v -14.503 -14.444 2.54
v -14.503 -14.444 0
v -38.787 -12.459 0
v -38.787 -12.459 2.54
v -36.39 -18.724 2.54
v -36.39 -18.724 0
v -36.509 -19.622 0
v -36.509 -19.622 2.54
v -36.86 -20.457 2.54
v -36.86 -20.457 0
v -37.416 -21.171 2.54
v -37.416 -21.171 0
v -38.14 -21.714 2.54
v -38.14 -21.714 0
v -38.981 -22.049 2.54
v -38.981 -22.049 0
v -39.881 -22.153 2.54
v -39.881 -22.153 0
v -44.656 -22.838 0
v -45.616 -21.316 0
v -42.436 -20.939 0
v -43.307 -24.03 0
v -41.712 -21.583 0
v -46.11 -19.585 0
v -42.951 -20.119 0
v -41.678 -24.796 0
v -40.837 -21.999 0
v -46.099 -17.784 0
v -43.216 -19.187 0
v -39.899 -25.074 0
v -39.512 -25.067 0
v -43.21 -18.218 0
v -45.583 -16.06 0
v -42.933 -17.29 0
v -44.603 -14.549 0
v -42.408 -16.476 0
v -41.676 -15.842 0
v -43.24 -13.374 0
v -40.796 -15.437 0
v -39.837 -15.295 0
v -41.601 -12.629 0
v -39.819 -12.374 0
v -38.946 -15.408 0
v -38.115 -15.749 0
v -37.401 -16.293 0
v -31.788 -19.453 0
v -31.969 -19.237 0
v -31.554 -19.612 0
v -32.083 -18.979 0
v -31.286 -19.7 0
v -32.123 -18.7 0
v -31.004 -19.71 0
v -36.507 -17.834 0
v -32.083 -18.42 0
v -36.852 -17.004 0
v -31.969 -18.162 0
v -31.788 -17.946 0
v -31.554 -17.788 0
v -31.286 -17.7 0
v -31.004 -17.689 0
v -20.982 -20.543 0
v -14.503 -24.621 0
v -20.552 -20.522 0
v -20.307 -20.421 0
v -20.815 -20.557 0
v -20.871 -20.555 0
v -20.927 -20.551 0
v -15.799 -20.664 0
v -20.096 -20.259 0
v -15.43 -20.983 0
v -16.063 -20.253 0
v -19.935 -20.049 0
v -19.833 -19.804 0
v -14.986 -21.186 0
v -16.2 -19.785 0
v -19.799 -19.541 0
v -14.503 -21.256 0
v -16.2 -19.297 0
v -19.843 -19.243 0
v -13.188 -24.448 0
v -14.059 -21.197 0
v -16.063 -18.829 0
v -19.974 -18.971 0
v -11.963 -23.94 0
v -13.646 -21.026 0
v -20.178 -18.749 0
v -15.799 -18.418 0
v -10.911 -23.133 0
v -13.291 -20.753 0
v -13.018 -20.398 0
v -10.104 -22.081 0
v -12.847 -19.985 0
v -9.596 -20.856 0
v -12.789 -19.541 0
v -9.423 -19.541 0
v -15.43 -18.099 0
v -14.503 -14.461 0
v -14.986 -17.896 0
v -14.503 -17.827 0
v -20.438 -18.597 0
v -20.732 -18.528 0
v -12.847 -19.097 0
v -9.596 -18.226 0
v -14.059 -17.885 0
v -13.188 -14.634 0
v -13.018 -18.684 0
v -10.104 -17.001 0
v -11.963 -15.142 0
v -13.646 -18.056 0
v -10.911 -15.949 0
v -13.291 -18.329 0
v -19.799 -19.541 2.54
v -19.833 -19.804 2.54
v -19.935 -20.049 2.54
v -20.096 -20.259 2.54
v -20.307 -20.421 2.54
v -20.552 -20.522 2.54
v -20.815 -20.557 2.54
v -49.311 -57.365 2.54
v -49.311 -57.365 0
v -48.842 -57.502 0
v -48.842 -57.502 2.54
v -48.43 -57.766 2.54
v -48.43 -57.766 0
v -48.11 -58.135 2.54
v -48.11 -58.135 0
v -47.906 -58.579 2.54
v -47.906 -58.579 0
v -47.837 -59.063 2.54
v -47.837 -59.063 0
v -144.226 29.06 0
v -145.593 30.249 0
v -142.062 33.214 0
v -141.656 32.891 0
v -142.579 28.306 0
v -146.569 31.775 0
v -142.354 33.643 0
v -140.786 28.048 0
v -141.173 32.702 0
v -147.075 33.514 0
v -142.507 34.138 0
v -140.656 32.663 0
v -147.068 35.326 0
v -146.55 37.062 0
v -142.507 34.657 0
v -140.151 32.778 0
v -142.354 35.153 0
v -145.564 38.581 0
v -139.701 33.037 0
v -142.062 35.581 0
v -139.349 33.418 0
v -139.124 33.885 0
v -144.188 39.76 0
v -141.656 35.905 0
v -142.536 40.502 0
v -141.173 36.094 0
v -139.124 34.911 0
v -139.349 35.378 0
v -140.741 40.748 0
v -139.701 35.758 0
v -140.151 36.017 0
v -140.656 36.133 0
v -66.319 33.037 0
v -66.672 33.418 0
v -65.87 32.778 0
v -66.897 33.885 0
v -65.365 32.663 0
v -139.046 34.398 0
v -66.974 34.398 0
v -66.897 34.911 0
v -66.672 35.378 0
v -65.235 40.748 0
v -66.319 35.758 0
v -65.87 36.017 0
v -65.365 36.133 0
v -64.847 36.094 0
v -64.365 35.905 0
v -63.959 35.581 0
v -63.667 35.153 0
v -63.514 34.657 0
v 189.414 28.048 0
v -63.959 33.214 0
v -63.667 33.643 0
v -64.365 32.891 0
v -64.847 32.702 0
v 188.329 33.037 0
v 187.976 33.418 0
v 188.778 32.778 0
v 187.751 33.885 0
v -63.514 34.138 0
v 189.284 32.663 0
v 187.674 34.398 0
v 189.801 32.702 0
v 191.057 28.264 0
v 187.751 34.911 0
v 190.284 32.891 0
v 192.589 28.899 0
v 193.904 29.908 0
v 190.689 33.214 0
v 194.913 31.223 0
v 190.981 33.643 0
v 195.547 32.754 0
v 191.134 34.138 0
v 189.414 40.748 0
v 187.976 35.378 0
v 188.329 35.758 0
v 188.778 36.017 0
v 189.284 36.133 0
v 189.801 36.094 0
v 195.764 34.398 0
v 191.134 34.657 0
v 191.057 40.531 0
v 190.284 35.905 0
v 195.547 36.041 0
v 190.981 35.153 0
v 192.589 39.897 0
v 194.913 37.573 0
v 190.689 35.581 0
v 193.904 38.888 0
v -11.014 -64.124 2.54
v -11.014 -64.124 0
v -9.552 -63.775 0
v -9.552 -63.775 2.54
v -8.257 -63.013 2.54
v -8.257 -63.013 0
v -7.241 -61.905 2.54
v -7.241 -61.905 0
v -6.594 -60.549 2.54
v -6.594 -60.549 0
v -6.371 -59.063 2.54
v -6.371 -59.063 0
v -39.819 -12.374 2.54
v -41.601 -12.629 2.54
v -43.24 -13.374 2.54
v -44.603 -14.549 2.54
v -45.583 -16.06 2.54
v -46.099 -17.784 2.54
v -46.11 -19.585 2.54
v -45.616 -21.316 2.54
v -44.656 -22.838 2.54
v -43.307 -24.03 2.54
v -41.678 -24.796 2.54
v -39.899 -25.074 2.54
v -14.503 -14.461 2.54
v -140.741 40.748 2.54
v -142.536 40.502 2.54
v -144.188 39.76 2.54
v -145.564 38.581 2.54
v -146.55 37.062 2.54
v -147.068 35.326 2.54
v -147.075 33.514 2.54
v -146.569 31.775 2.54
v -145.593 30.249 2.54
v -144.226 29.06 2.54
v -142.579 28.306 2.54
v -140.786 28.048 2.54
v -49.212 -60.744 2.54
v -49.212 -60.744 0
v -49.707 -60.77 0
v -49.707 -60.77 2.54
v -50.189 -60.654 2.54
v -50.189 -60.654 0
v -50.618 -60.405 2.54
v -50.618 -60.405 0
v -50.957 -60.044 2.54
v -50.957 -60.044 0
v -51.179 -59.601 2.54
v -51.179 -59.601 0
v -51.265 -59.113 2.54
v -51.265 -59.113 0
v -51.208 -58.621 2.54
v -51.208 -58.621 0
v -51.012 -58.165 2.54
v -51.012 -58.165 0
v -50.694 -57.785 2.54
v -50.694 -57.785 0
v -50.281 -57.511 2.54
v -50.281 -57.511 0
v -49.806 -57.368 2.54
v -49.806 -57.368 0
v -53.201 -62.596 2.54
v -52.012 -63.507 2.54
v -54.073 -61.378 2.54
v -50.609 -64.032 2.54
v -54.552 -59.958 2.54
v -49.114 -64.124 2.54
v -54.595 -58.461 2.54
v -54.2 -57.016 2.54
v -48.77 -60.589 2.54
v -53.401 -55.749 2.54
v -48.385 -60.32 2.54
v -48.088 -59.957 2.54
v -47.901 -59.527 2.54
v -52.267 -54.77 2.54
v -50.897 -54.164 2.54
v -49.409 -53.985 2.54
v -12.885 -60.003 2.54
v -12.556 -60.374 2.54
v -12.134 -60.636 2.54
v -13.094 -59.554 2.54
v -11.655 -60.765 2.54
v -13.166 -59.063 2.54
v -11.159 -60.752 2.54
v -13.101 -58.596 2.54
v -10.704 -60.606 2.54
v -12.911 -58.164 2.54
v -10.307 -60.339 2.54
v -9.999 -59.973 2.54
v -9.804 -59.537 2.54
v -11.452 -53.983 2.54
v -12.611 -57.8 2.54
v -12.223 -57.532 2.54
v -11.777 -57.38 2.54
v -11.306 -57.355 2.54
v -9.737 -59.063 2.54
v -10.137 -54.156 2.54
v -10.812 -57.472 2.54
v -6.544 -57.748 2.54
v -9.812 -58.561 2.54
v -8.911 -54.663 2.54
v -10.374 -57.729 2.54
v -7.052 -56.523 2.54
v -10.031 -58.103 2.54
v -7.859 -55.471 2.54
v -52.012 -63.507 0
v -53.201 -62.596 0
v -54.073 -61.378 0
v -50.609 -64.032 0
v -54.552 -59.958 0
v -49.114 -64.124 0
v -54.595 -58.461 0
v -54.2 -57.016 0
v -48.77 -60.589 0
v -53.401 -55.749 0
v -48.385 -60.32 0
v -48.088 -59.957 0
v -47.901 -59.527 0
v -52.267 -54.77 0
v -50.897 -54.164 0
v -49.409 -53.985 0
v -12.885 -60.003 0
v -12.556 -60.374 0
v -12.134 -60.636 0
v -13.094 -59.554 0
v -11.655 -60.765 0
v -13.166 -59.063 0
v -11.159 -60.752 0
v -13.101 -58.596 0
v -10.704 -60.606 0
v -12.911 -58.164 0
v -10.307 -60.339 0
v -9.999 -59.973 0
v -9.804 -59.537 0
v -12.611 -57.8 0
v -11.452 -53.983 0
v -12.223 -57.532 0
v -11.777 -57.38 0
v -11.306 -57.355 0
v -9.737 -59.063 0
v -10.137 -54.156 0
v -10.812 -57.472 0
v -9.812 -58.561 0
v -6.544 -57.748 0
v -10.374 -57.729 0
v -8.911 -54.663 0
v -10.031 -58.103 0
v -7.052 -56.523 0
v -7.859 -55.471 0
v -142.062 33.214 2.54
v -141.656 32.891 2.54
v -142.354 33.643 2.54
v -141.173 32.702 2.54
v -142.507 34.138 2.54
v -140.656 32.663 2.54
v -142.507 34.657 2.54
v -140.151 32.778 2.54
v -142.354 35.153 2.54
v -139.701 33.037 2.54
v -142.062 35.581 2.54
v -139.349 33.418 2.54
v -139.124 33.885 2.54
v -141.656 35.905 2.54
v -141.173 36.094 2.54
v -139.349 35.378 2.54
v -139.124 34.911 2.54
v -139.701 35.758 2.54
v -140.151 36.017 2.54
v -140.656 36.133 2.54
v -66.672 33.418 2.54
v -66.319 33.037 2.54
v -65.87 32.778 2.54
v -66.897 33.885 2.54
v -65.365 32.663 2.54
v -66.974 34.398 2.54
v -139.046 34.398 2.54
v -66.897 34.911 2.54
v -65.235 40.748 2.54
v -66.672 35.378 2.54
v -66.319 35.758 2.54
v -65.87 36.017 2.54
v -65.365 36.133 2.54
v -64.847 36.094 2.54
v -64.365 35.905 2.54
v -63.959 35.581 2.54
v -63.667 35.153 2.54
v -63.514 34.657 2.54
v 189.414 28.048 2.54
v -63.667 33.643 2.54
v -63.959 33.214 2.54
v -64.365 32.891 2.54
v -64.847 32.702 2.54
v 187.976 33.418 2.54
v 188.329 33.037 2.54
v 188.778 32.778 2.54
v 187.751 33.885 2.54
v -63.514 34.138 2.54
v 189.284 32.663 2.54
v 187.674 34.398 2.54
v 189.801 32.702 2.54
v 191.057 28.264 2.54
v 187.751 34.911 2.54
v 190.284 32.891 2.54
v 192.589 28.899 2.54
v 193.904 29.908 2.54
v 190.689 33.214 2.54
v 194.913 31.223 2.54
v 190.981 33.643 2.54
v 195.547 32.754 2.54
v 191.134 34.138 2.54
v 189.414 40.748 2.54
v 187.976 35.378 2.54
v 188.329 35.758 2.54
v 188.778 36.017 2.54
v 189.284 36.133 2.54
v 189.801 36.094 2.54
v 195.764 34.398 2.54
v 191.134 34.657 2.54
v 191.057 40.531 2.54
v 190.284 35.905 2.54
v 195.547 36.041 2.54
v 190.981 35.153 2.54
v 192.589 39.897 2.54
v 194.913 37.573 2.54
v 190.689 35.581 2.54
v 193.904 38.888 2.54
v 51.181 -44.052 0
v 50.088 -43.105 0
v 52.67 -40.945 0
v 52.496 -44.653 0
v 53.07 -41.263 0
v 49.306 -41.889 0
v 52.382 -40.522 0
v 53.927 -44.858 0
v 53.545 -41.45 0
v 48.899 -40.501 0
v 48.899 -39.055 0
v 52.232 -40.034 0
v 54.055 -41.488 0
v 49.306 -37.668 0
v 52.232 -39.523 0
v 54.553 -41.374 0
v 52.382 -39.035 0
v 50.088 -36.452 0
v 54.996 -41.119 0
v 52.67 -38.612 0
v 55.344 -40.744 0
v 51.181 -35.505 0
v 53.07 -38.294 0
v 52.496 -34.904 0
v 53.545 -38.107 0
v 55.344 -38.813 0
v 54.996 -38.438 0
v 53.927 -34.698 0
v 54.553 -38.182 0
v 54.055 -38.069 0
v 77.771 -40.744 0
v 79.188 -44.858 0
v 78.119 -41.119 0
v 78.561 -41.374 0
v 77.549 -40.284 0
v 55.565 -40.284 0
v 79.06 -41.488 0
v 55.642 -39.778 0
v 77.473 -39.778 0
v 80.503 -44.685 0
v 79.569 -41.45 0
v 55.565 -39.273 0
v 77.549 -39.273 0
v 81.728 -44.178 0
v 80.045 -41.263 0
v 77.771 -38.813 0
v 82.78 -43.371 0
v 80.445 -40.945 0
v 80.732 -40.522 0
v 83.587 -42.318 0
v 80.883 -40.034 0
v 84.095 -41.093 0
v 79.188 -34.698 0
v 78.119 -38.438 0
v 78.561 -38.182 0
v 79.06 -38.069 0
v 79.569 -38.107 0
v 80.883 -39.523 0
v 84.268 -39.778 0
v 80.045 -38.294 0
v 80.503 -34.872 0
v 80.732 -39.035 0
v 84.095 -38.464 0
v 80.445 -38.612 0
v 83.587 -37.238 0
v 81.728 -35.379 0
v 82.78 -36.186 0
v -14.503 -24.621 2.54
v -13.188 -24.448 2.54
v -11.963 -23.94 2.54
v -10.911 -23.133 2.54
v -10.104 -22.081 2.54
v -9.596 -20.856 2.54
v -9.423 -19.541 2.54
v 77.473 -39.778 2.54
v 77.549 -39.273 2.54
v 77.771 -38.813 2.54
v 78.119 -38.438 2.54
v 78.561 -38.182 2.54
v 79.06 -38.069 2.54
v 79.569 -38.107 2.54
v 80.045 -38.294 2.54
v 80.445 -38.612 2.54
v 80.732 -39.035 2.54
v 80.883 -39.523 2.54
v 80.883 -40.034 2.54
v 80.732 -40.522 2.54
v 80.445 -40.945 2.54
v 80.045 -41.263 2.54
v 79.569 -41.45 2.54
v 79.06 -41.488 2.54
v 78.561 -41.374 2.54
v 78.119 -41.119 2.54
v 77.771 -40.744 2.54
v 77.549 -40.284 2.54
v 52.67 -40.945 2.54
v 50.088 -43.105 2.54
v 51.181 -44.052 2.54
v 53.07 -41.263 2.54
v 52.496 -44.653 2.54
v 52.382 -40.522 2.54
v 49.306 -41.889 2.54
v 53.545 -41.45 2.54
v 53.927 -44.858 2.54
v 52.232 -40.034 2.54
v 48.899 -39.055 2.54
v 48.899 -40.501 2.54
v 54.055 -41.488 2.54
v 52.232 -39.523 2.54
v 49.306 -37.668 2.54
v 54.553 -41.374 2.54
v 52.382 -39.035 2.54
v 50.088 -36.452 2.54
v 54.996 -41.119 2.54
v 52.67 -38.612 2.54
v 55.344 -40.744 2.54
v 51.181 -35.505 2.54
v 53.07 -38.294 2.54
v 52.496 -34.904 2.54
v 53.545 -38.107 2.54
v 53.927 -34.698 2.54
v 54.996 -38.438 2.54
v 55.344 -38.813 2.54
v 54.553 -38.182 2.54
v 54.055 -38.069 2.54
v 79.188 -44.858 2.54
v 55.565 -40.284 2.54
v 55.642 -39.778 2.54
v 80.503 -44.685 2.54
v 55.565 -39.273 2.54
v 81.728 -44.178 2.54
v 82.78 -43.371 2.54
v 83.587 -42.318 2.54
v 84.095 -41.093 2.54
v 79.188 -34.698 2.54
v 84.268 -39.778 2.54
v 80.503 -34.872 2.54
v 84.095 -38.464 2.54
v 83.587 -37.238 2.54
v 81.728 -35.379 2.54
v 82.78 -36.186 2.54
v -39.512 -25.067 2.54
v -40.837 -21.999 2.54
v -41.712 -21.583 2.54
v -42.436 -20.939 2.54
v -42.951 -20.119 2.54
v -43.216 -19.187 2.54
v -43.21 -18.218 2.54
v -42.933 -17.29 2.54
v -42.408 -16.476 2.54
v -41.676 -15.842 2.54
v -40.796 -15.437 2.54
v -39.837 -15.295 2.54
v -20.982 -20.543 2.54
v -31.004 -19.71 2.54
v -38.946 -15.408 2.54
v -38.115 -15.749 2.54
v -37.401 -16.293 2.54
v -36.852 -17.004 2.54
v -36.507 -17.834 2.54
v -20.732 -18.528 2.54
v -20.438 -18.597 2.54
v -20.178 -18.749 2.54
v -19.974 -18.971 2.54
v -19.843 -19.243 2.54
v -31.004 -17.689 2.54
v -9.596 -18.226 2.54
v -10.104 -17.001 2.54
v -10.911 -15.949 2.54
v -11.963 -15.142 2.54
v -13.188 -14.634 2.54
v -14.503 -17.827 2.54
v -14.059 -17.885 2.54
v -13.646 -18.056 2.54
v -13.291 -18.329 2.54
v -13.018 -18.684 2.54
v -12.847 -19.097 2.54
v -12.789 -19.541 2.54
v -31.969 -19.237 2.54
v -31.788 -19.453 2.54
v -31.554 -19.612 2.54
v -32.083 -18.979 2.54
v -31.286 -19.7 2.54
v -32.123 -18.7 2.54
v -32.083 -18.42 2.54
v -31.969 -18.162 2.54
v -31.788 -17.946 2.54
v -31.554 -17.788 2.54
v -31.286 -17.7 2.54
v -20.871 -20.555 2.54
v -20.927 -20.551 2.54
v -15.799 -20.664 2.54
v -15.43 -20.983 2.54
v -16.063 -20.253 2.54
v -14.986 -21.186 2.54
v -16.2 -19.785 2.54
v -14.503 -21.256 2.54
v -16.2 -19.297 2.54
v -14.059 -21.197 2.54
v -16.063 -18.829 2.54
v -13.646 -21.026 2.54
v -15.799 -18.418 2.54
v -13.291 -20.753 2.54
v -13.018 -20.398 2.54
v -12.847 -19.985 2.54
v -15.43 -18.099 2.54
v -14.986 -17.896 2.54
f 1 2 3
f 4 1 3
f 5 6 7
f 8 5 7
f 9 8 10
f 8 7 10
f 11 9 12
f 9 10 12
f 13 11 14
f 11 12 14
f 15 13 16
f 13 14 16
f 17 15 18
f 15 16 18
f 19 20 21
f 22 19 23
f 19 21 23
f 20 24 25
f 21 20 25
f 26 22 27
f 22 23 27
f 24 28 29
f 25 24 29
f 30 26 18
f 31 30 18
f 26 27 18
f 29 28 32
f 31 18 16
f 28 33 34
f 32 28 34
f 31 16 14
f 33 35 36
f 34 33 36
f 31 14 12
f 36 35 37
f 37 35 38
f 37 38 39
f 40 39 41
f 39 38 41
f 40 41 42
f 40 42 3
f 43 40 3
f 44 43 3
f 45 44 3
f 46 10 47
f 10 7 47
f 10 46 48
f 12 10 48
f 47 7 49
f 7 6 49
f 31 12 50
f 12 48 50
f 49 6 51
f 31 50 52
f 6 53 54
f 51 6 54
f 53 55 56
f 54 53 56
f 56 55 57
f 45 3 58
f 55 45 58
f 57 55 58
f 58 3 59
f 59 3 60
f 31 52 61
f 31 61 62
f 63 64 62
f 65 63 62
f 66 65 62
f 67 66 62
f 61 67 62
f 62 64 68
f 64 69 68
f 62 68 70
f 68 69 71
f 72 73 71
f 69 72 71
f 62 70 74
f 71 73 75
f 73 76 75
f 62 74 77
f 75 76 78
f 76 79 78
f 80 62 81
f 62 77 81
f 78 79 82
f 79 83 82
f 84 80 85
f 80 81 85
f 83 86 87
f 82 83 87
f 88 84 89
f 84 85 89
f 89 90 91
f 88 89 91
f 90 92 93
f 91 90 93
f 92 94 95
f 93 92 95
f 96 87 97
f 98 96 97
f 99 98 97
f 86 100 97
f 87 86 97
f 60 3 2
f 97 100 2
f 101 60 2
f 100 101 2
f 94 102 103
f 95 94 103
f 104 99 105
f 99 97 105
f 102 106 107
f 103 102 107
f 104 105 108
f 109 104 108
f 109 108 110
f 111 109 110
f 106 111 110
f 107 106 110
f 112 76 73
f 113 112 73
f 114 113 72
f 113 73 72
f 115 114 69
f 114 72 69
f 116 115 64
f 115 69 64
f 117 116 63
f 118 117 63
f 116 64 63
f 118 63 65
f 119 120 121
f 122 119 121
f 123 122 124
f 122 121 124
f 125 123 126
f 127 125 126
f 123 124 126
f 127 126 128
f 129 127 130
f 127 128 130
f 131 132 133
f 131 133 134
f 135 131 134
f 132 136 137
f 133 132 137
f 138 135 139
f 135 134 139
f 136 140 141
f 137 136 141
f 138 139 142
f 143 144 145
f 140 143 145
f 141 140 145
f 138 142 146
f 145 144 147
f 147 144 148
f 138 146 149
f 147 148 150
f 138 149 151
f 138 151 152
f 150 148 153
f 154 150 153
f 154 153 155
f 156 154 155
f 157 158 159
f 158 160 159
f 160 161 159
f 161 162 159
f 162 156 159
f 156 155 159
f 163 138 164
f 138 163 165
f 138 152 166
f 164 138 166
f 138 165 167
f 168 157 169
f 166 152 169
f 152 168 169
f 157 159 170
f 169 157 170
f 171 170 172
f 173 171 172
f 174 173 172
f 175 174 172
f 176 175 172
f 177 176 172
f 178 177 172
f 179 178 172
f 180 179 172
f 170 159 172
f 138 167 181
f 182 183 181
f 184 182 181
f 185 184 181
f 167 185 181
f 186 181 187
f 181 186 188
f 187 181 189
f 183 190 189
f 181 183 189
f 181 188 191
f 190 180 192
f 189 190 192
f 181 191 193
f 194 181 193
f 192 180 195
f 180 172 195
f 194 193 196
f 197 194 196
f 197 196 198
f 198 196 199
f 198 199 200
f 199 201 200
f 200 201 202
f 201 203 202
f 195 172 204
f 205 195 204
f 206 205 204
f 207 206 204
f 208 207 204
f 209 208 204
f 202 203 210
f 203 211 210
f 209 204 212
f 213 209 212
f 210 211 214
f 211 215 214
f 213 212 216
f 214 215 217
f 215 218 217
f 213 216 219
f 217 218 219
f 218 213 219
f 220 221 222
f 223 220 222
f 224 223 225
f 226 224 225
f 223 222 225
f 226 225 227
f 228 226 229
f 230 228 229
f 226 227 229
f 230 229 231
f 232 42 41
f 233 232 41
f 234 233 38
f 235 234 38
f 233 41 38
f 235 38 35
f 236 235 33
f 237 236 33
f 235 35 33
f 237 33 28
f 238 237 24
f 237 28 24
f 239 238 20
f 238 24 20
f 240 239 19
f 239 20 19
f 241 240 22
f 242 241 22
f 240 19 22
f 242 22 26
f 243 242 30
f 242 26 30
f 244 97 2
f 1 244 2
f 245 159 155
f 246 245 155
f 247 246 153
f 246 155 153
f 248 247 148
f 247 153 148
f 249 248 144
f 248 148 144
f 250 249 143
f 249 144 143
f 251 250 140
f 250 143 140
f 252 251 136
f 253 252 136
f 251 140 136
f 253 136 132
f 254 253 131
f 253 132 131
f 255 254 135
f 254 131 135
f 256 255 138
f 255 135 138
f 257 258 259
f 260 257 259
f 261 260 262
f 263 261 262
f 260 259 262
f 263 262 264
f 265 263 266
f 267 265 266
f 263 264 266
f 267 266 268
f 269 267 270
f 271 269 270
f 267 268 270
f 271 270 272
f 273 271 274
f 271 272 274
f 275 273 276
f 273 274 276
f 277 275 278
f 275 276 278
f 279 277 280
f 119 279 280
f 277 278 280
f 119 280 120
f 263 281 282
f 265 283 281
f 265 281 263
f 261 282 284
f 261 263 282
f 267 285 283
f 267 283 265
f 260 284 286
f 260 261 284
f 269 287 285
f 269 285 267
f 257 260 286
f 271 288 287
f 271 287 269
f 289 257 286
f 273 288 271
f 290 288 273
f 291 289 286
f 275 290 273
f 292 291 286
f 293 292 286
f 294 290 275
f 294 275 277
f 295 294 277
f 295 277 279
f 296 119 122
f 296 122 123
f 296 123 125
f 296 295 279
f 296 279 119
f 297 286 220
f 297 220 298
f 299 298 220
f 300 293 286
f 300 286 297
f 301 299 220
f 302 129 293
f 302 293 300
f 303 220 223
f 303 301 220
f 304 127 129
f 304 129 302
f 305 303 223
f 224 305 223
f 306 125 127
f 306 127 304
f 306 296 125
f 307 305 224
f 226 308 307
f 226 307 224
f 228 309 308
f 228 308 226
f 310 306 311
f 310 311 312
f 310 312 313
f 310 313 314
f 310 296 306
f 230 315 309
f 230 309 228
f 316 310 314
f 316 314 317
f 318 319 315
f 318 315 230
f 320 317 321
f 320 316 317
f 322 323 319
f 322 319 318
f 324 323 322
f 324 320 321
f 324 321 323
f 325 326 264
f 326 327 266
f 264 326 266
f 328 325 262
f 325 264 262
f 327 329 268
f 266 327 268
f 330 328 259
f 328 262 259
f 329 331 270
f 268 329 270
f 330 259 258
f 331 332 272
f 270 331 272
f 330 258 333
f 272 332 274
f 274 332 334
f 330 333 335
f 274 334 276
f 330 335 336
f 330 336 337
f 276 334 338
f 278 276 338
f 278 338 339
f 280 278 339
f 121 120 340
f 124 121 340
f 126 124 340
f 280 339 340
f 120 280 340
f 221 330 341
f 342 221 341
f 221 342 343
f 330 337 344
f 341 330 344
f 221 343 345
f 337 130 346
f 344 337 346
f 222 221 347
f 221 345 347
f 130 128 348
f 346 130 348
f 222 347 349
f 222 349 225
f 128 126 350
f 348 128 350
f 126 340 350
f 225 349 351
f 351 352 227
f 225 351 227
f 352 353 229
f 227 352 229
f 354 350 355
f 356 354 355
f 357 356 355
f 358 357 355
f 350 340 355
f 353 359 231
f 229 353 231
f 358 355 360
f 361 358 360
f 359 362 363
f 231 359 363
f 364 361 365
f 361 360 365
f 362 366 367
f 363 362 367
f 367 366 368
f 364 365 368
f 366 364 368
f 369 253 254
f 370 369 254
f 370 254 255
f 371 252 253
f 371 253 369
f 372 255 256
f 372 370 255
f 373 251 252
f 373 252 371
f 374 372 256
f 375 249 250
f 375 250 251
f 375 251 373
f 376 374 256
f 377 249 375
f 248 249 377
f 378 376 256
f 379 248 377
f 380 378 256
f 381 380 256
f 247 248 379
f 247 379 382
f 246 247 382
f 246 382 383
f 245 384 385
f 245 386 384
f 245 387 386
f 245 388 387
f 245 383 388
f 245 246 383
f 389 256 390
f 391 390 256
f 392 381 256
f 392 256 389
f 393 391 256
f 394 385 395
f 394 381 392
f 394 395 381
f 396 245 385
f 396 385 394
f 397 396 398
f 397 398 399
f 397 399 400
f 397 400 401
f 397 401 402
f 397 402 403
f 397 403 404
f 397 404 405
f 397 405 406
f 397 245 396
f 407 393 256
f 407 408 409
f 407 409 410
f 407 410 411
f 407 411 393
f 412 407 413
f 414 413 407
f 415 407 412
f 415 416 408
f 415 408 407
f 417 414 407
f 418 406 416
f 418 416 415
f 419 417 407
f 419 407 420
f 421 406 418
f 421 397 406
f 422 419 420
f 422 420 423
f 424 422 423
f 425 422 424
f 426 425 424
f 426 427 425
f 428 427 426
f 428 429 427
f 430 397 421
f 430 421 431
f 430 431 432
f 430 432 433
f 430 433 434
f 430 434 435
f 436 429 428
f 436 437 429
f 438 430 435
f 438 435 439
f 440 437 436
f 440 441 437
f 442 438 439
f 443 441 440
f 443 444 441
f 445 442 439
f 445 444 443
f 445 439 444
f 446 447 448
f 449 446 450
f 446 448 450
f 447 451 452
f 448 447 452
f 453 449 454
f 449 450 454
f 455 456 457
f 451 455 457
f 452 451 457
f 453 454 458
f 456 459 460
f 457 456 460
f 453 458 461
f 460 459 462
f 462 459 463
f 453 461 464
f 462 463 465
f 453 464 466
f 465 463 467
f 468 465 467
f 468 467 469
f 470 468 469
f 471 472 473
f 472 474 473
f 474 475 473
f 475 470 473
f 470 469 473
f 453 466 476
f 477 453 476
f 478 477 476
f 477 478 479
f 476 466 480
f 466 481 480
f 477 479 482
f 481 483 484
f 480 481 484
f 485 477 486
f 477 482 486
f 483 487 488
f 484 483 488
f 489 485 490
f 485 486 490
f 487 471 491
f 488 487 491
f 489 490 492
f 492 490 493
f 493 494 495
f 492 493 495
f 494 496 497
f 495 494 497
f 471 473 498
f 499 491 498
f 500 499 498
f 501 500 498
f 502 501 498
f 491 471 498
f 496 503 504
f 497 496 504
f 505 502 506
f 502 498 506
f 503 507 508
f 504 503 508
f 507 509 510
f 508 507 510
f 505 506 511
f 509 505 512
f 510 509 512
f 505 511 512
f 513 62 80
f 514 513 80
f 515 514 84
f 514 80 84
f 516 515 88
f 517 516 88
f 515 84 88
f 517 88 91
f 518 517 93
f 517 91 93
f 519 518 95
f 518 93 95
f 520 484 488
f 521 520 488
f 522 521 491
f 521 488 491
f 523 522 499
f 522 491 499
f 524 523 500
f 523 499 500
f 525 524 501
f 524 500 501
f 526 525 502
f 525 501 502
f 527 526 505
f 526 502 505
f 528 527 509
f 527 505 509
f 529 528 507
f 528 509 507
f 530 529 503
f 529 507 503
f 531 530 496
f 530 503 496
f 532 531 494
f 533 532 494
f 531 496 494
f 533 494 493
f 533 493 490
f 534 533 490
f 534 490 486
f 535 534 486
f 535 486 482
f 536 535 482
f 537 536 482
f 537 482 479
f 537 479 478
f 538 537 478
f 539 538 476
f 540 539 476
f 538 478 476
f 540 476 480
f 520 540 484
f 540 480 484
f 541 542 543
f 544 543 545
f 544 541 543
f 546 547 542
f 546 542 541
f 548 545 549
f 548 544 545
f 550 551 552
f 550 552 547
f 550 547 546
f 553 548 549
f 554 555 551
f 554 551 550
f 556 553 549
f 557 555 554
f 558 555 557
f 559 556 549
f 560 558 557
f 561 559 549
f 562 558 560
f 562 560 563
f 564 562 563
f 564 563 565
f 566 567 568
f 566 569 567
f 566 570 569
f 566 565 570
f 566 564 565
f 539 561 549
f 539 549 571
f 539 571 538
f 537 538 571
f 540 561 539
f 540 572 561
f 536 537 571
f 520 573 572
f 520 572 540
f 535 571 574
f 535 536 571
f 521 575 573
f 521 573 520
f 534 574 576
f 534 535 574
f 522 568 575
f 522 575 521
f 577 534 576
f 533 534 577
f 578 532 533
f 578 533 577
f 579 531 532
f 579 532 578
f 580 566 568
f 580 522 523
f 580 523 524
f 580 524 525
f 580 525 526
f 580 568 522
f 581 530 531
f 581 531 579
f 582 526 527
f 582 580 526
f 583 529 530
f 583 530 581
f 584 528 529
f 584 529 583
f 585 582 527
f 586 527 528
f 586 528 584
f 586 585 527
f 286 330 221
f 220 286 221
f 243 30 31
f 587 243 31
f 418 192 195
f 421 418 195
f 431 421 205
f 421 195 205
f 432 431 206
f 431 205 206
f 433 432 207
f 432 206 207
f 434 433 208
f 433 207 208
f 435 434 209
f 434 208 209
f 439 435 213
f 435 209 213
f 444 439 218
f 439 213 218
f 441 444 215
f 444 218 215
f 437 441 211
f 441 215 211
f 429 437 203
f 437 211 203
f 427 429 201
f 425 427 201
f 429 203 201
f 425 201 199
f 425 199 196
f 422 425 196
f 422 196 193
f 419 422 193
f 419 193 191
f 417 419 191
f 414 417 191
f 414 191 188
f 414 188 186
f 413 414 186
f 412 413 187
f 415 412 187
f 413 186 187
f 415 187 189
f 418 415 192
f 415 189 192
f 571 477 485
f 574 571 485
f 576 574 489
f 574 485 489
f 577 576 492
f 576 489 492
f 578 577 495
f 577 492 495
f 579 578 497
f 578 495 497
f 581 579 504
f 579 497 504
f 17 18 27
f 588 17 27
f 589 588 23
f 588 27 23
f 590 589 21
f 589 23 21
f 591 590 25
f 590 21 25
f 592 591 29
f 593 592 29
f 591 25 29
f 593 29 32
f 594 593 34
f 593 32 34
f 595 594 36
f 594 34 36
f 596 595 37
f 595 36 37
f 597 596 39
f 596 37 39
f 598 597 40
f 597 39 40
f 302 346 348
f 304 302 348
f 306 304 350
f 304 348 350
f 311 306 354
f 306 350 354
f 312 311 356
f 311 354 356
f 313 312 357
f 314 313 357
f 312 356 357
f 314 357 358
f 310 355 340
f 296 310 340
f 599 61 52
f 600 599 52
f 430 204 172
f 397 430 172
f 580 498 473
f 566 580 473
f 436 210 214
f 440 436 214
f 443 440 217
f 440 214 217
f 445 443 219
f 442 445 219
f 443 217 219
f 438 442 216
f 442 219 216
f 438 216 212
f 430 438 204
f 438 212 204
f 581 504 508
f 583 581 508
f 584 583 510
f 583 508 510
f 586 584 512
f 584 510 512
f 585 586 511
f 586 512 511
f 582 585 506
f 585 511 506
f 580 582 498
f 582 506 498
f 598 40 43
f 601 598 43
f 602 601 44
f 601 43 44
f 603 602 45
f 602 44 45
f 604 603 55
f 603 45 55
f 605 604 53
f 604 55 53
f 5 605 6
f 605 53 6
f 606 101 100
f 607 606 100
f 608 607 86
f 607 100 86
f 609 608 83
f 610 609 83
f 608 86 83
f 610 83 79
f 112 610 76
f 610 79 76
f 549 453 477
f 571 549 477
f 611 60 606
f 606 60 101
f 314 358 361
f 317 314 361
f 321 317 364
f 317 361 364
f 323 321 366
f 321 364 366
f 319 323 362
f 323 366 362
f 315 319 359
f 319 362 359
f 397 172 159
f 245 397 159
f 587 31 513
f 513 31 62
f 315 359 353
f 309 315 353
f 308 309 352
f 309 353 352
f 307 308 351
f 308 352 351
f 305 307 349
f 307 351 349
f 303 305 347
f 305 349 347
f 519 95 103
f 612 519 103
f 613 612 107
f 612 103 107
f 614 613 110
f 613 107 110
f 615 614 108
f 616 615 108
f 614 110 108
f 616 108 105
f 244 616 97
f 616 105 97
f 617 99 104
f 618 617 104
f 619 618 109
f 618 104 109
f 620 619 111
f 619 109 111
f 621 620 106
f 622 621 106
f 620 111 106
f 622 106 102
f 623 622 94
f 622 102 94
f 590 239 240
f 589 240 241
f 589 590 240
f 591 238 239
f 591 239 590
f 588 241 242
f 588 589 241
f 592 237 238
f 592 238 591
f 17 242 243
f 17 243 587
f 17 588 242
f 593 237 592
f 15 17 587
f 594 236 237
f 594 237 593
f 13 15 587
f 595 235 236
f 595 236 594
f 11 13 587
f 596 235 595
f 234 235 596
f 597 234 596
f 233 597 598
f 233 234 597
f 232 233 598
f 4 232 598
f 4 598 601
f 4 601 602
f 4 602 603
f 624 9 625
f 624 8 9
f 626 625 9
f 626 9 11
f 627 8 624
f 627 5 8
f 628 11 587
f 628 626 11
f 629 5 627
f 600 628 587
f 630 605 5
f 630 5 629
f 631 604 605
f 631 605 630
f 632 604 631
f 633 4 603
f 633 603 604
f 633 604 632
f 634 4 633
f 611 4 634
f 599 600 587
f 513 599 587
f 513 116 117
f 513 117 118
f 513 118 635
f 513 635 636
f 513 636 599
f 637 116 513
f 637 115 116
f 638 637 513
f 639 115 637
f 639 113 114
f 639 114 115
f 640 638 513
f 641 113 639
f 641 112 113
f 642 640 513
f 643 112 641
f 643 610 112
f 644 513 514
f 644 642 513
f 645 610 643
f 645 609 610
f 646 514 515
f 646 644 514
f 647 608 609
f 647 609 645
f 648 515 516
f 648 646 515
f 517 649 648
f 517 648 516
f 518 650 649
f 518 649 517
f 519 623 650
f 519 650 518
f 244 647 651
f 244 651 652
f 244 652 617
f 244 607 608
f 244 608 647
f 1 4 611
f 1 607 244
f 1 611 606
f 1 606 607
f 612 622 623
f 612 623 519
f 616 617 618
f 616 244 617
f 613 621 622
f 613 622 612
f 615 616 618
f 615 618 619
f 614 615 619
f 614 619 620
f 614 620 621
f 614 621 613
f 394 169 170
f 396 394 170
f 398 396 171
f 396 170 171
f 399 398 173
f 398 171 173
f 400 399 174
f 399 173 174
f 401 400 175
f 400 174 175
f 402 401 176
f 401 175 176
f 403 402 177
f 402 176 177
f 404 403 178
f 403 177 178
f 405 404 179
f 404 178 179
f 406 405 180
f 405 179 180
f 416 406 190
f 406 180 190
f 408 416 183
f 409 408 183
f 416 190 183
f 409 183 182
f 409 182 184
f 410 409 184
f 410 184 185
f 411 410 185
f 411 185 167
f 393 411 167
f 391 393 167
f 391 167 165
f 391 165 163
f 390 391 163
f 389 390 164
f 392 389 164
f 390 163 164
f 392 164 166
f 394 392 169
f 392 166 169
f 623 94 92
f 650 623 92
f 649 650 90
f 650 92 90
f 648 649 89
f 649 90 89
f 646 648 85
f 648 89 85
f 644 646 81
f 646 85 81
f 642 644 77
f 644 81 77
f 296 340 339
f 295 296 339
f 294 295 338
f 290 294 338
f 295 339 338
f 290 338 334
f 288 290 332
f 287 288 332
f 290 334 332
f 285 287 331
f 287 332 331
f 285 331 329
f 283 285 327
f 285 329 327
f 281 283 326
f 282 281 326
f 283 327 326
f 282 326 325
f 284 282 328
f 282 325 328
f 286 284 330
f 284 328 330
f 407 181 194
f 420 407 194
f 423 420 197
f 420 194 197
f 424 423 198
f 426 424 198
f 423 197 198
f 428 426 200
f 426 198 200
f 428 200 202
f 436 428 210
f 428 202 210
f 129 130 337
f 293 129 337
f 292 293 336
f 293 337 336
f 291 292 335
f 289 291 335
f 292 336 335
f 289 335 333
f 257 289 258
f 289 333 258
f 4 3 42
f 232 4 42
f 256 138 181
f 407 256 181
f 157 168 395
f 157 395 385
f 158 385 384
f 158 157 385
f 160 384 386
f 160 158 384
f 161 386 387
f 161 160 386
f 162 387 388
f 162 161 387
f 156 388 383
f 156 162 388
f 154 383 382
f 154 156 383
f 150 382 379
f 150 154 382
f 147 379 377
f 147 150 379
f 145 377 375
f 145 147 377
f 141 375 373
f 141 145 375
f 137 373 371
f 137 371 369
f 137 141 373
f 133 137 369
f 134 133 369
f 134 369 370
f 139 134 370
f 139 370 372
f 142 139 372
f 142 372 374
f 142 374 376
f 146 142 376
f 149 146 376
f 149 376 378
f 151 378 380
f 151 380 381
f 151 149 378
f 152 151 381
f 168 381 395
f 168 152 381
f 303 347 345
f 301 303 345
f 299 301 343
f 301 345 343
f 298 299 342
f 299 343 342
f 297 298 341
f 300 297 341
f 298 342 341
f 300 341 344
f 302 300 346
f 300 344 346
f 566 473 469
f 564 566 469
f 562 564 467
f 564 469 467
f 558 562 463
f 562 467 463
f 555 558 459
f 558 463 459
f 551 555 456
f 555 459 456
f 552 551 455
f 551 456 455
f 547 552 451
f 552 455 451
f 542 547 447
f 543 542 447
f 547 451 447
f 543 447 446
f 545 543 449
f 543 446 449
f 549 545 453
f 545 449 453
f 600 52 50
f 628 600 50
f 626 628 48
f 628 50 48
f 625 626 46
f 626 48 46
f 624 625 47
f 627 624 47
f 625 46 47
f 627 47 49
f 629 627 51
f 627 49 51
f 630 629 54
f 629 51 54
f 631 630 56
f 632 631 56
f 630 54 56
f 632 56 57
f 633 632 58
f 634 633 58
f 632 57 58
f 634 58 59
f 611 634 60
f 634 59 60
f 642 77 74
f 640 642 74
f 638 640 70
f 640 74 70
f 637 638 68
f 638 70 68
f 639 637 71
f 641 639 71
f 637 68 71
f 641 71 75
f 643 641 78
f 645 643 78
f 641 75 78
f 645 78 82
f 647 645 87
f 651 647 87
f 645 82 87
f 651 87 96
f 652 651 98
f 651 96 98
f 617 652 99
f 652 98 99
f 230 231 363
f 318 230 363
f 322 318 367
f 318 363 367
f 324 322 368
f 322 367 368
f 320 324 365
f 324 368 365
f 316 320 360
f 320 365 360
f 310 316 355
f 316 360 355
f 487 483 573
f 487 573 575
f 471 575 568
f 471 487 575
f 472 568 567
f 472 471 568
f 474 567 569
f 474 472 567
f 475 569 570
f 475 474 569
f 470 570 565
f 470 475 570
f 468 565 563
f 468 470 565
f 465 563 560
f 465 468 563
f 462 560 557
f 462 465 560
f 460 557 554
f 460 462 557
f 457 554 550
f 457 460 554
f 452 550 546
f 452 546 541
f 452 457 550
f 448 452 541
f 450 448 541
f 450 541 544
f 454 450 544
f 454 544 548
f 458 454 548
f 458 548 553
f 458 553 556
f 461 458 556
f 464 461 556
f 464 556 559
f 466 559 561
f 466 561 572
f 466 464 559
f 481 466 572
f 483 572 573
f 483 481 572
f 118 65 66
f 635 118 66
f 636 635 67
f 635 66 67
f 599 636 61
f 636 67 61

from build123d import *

# Parameters (mm, degrees)
F0_R     = 1.7399
F1_DEPTH = 2.54
F3_DEPTH = 2.54
F4_R     = 1.7145
F5_DEPTH = 2.54
F7_DEPTH = 2.54


# Not quite as in the source:
# - a feature names something its author has since deleted; it is built from what else it names


with BuildPart() as f1:
    # F0 (on Top) → F1 (new body)
    with BuildSketch(Plane.XY):
        with BuildLine():
            Line((-66.9744420796, 34.3977775435), (-71.5845430945, 34.3977775435))
            ThreePointArc((-71.5845430945, 34.3977775435), (-69.7246708578, 29.9076487653), (-65.2345420796, 28.0477765286))
            ThreePointArc((-65.2345420796, 28.0477765286), (-60.7444133014, 29.9076487653), (-58.8845410646, 34.3977775435))
            Line((-58.8845410646, 34.3977775435), (-63.4946420796, 34.3977775435))
            ThreePointArc((-63.4946420796, 34.3977775435), (-65.2345420796, 32.6578775435), (-66.9744420796, 34.3977775435))
        make_face()
        with BuildLine():
            ThreePointArc((-65.2345420796, 40.7477785584), (-69.7246708578, 38.8879063217), (-71.5845430945, 34.3977775435))
            Line((-71.5845430945, 34.3977775435), (-66.9744420796, 34.3977775435))
            ThreePointArc((-66.9744420796, 34.3977775435), (-65.2345420796, 36.1376775435), (-63.4946420796, 34.3977775435))
            Line((-63.4946420796, 34.3977775435), (-58.8845410646, 34.3977775435))
            ThreePointArc((-58.8845410646, 34.3977775435), (-60.7444133014, 38.8879063217), (-65.2345420796, 40.7477785584))
        make_face()
        with BuildLine():
            ThreePointArc((-140.7862693794, 28.0477775435), (-136.2961413189, 29.907649483), (-134.4362693794, 34.3977775435))
            ThreePointArc((-134.4362693794, 34.3977775435), (-136.2801574251, 38.8718646074), (-140.7409796332, 40.7476160327))
            ThreePointArc((-140.7409796332, 40.7476160327), (-147.1362290016, 34.4204225606), (-140.7862693794, 28.0477775435))
        make_face()
        with Locations((-140.7862693794, 34.3977775435)):
            Circle(F0_R, mode=Mode.SUBTRACT)
        with BuildLine():
            ThreePointArc((195.7637350565, 34.3977775435), (193.9038617876, 38.8879087708), (189.4137305353, 40.7477819794))
            ThreePointArc((189.4137305353, 40.7477819794), (184.9235993933, 38.8879087105), (183.0637261847, 34.3977775435))
            ThreePointArc((183.0637261847, 34.3977775435), (184.9235993933, 29.9076463765), (189.4137305353, 28.0477731076))
            ThreePointArc((189.4137305353, 28.0477731076), (193.9038617876, 29.9076463162), (195.7637350565, 34.3977775435))
        make_face()
        with BuildLine():
            ThreePointArc((191.1536306206, 34.3977775435), (189.4137306206, 32.6578775435), (187.6738306206, 34.3977775435))
            ThreePointArc((187.6738306206, 34.3977775435), (189.4137306206, 36.1376775435), (191.1536306206, 34.3977775435))
        make_face(mode=Mode.SUBTRACT)
        with BuildLine():
            Line((-71.5845430945, 34.3977775435), (-134.4362693794, 34.3977775435))
            ThreePointArc((-134.4362693794, 34.3977775435), (-136.2961413189, 29.907649483), (-140.7862693794, 28.0477775435))
            Line((-140.7862693794, 28.0477775435), (-65.2345420796, 28.0477765285))
            ThreePointArc((-65.2345420796, 28.0477765286), (-69.7246708578, 29.9076487653), (-71.5845430945, 34.3977775435))
        make_face()
        with BuildLine():
            ThreePointArc((-140.7409796332, 40.7476160327), (-136.2801574251, 38.8718646074), (-134.4362693794, 34.3977775435))
            Line((-134.4362693794, 34.3977775435), (-71.5845430945, 34.3977775435))
            ThreePointArc((-71.5845430945, 34.3977775435), (-69.7246708578, 38.8879063217), (-65.2345420796, 40.7477785584))
            Line((-65.2345420796, 40.7477785585), (-140.7409796332, 40.7476160327))
        make_face()
        with BuildLine():
            ThreePointArc((-58.8845410646, 34.3977775435), (-60.7444133014, 29.9076487653), (-65.2345420796, 28.0477765286))
            Line((-65.2345420796, 28.0477765285), (189.4137305353, 28.0477731076))
            ThreePointArc((189.4137305353, 28.0477731076), (184.9235993933, 29.9076463765), (183.0637261847, 34.3977775435))
            Line((183.0637261847, 34.3977775435), (-58.8845410646, 34.3977775435))
        make_face()
        with BuildLine():
            Line((189.4137305353, 40.7477819794), (-65.2345420796, 40.7477785585))
            ThreePointArc((-65.2345420796, 40.7477785584), (-60.7444133014, 38.8879063217), (-58.8845410646, 34.3977775435))
            Line((-58.8845410646, 34.3977775435), (183.0637261847, 34.3977775435))
            ThreePointArc((183.0637261847, 34.3977775435), (184.9235993933, 38.8879087105), (189.4137305353, 40.7477819794))
        make_face()
    extrude(amount=F1_DEPTH)


with BuildPart() as f3:
    # F2 (on Top) → F3 (new body)
    with BuildSketch(Plane.XY):
        with BuildLine():
            Line((-14.5032220102, -14.4440956048), (-38.7873029648, -12.4586465028))
            ThreePointArc((-38.7873029648, -12.4586465028), (-34.9776667278, -14.6150092623), (-33.4687510894, -18.7243160414))
            ThreePointArc((-33.4687510894, -18.7243160414), (-35.2214632817, -23.104663609), (-39.5120407945, -25.0669045346))
            Line((-39.5120407945, -25.0669045346), (-14.5032220102, -24.6210461602))
            ThreePointArc((-14.5032220102, -24.6210461602), (-19.5832220102, -19.5410461602), (-14.5032220102, -14.4610461602))
            Line((-14.5032220102, -14.4610461602), (-14.5032220102, -14.4440956048))
        make_face()
        with BuildLine():
            ThreePointArc((-20.7319625899, -18.5284234777), (-20.067623094, -18.8525118323), (-19.7987351869, -19.5410461602))
            ThreePointArc((-19.7987351869, -19.5410461602), (-20.0963146972, -20.2594666499), (-20.8147351869, -20.5570461602))
            ThreePointArc((-20.8147351869, -20.5570461602), (-20.8988618396, -20.5535572497), (-20.9824107159, -20.5431144797))
            Line((-20.9824107159, -20.5431144797), (-31.0041907261, -19.7104334206))
            ThreePointArc((-31.0041907261, -19.7104334206), (-32.1225060361, -18.6995983315), (-31.0041907261, -17.6887632424))
            Line((-31.0041907261, -17.6887632424), (-20.7319625899, -18.5284234777))
        make_face(mode=Mode.SUBTRACT)
        with BuildLine():
            Line((-39.8372522723, -15.2953659533), (-39.8187510894, -12.3743160414))
            ThreePointArc((-39.8187510894, -12.3743160414), (-46.1686237239, -18.6840975724), (-39.899186414, -25.0738065846))
            Line((-39.899186414, -25.0738065846), (-39.880685231, -22.1527566726))
            ThreePointArc((-39.880685231, -22.1527566726), (-43.247682312, -18.7025980681), (-39.8372522723, -15.2953659533))
        make_face()
        with BuildLine():
            Line((-38.7873029648, -12.4586465028), (-39.8187510894, -12.3743160414))
            Line((-39.8187510894, -12.3743160414), (-39.8372522723, -15.2953659533))
            ThreePointArc((-39.8372522723, -15.2953659533), (-37.4006319397, -16.2931145322), (-36.3897510894, -18.7243160414))
            ThreePointArc((-36.3897510894, -18.7243160414), (-37.4160787409, -21.1707842275), (-39.880685231, -22.1527566726))
            Line((-39.880685231, -22.1527566726), (-39.899186414, -25.0738065846))
            Line((-39.899186414, -25.0738065846), (-39.5120407945, -25.0669045346))
            ThreePointArc((-39.5120407945, -25.0669045346), (-35.2214632817, -23.104663609), (-33.4687510894, -18.7243160414))
            ThreePointArc((-33.4687510894, -18.7243160414), (-34.9776667278, -14.6150092623), (-38.7873029648, -12.4586465028))
        make_face()
        with BuildLine():
            ThreePointArc((-14.5032220102, -14.4610461602), (-19.5832220102, -19.5410461602), (-14.5032220102, -24.6210461602))
            Line((-14.5032220102, -24.6210461602), (-14.5032220102, -21.2555461602))
            ThreePointArc((-14.5032220102, -21.2555461602), (-16.2177220102, -19.5410461602), (-14.5032220102, -17.8265461602))
            Line((-14.5032220102, -17.8265461602), (-14.5032220102, -14.4610461602))
        make_face()
        with BuildLine():
            Line((-14.5032220102, -21.2555461602), (-14.5032220102, -24.6210461602))
            ThreePointArc((-14.5032220102, -24.6210461602), (-10.9111195618, -23.1331486087), (-9.4232220102, -19.5410461602))
            ThreePointArc((-9.4232220102, -19.5410461602), (-10.9111195618, -15.9489437118), (-14.5032220102, -14.4610461602))
            Line((-14.5032220102, -14.4610461602), (-14.5032220102, -17.8265461602))
            ThreePointArc((-14.5032220102, -17.8265461602), (-13.2908874339, -18.3287115839), (-12.7887220102, -19.5410461602))
            ThreePointArc((-12.7887220102, -19.5410461602), (-13.2908874339, -20.7533807366), (-14.5032220102, -21.2555461602))
        make_face()
    extrude(amount=F3_DEPTH)


with BuildPart() as f5:
    # F4 (on Top) → F5 (new body)
    with BuildSketch(Plane.XY):
        with BuildLine():
            ThreePointArc((53.9270043373, -44.8584560919), (57.5191067857, -43.3705585403), (59.0070043373, -39.7784560919))
            ThreePointArc((59.0070043373, -39.7784560919), (57.5191067857, -36.1863536435), (53.9270043373, -34.6984560919))
            ThreePointArc((53.9270043373, -34.6984560919), (48.8470043373, -39.7784560919), (53.9270043373, -44.8584560919))
        make_face()
        with Locations((53.9270043373, -39.7784560919)):
            Circle(F4_R, mode=Mode.SUBTRACT)
        with BuildLine():
            ThreePointArc((53.9270043373, -34.6984560919), (57.5191067857, -36.1863536435), (59.0070043373, -39.7784560919))
            Line((59.0070043373, -39.7784560919), (74.1077731681, -39.7784560919))
            ThreePointArc((74.1077731681, -39.7784560919), (75.5956707197, -36.1863536435), (79.1877731681, -34.6984560919))
            Line((79.1877731681, -34.6984560919), (53.9270043373, -34.6984560919))
        make_face()
        with BuildLine():
            Line((74.1077731681, -39.7784560919), (59.0070043373, -39.7784560919))
            ThreePointArc((59.0070043373, -39.7784560919), (57.5191067857, -43.3705585403), (53.9270043373, -44.8584560919))
            Line((53.9270043373, -44.8584560919), (79.1877731681, -44.8584560919))
            ThreePointArc((79.1877731681, -44.8584560919), (75.5956707197, -43.3705585403), (74.1077731681, -39.7784560919))
        make_face()
        with BuildLine():
            ThreePointArc((79.1877731681, -34.6984560919), (75.5956707197, -36.1863536435), (74.1077731681, -39.7784560919))
            ThreePointArc((74.1077731681, -39.7784560919), (75.5956707197, -43.3705585403), (79.1877731681, -44.8584560919))
            ThreePointArc((79.1877731681, -44.8584560919), (82.7798756165, -43.3705585403), (84.2677731681, -39.7784560919))
            ThreePointArc((84.2677731681, -39.7784560919), (82.7798756165, -36.1863536435), (79.1877731681, -34.6984560919))
        make_face()
        with BuildLine():
            ThreePointArc((80.9022731681, -39.7784560919), (79.1877731681, -41.4929560919), (77.4732731681, -39.7784560919))
            ThreePointArc((77.4732731681, -39.7784560919), (79.1877731681, -38.0639560919), (80.9022731681, -39.7784560919))
        make_face(mode=Mode.SUBTRACT)
    extrude(amount=F5_DEPTH)


with BuildPart() as f7:
    # F6 (on Top) → F7 (new body)
    with BuildSketch(Plane.XY):
        with BuildLine():
            ThreePointArc((-49.3108029973, -57.3654139877), (-48.2567317102, -57.9388698208), (-47.8368081551, -59.062961489))
            Line((-47.8368081551, -59.062961489), (-44.4713081551, -59.062961489))
            ThreePointArc((-44.4713081551, -59.062961489), (-45.9093825635, -55.5213830294), (-49.4094097241, -53.9849436832))
            Line((-49.4094097241, -53.9849436832), (-49.3108029973, -57.3654139877))
        make_face()
        with BuildLine():
            Line((-44.4713081551, -59.062961489), (-47.8368081551, -59.062961489))
            ThreePointArc((-47.8368081551, -59.062961489), (-48.2245068277, -60.1488291087), (-49.2122627922, -60.7436037745))
            Line((-49.2122627922, -60.7436037745), (-49.1136560654, -64.1240740789))
            ThreePointArc((-49.1136560654, -64.1240740789), (-45.8076687083, -62.4968461248), (-44.4713081551, -59.062961489))
        make_face()
        with BuildLine():
            ThreePointArc((-49.4094097241, -53.9849436832), (-45.9093825635, -55.5213830294), (-44.4713081551, -59.062961489))
            Line((-44.4713081551, -59.062961489), (-28.0248081551, -59.062961489))
            Line((-28.0248081551, -59.062961489), (-16.5313081551, -59.062961489))
            ThreePointArc((-16.5313081551, -59.062961489), (-15.0435043934, -55.4709528329), (-11.4515734366, -53.9829614959))
            Line((-11.4515734366, -53.9829614959), (-49.4094097241, -53.9849436832))
        make_face()
        with BuildLine():
            Line((-28.0248081551, -59.062961489), (-44.4713081551, -59.062961489))
            ThreePointArc((-44.4713081551, -59.062961489), (-45.8076687083, -62.4968461248), (-49.1136560654, -64.1240740789))
            Line((-49.1136560654, -64.1240740789), (-11.8889602447, -64.1240740789))
            ThreePointArc((-11.8889602447, -64.1240740789), (-15.1949476019, -62.4968461248), (-16.5313081551, -59.062961489))
            Line((-16.5313081551, -59.062961489), (-28.0248081551, -59.062961489))
        make_face()
        with BuildLine():
            ThreePointArc((-49.2122627922, -60.7436037745), (-51.2650792192, -59.1129513838), (-49.3108029973, -57.3654139877))
            Line((-49.3108029973, -57.3654139877), (-49.4094097241, -53.9849436832))
            ThreePointArc((-49.4094097241, -53.9849436832), (-54.6291483452, -59.2110796959), (-49.1136560654, -64.1240740789))
            Line((-49.1136560654, -64.1240740789), (-49.2122627922, -60.7436037745))
        make_face()
        with BuildLine():
            ThreePointArc((-11.4515734366, -53.9829614959), (-15.0435043934, -55.4709528329), (-16.5313081551, -59.062961489))
            Line((-16.5313081551, -59.062961489), (-13.1658081551, -59.062961489))
            ThreePointArc((-13.1658081551, -59.062961489), (-12.6111226715, -57.8002895056), (-11.3059766736, -57.3546321851))
            Line((-11.3059766736, -57.3546321851), (-11.4515734366, -53.9829614959))
        make_face()
        with BuildLine():
            Line((-13.1658081551, -59.062961489), (-16.5313081551, -59.062961489))
            ThreePointArc((-16.5313081551, -59.062961489), (-15.1949476019, -62.4968461248), (-11.8889602447, -64.1240740789))
            Line((-11.8889602447, -64.1240740789), (-11.0136560654, -64.1240740789))
            Line((-11.0136560654, -64.1240740789), (-11.1592528283, -60.7524033897))
            ThreePointArc((-11.1592528283, -60.7524033897), (-12.5555684034, -60.3744947725), (-13.1658081551, -59.062961489))
        make_face()
        with BuildLine():
            ThreePointArc((-6.3713081551, -59.062961489), (-7.859299499, -55.4707652506), (-11.4515734366, -53.9829614959))
            Line((-11.4515734366, -53.9829614959), (-11.3059766736, -57.3546321851))
            ThreePointArc((-11.3059766736, -57.3546321851), (-10.1886361717, -57.9031469725), (-9.7368081551, -59.062961489))
            ThreePointArc((-9.7368081551, -59.062961489), (-10.1397748715, -60.1672217374), (-11.1592528283, -60.7524033897))
            Line((-11.1592528283, -60.7524033897), (-11.0136560654, -64.1240740789))
            ThreePointArc((-11.0136560654, -64.1240740789), (-7.7076687083, -62.4968461248), (-6.3713081551, -59.062961489))
        make_face()
    extrude(amount=F7_DEPTH)


solid = Compound([f1.part, f3.part, f5.part, f7.part])
